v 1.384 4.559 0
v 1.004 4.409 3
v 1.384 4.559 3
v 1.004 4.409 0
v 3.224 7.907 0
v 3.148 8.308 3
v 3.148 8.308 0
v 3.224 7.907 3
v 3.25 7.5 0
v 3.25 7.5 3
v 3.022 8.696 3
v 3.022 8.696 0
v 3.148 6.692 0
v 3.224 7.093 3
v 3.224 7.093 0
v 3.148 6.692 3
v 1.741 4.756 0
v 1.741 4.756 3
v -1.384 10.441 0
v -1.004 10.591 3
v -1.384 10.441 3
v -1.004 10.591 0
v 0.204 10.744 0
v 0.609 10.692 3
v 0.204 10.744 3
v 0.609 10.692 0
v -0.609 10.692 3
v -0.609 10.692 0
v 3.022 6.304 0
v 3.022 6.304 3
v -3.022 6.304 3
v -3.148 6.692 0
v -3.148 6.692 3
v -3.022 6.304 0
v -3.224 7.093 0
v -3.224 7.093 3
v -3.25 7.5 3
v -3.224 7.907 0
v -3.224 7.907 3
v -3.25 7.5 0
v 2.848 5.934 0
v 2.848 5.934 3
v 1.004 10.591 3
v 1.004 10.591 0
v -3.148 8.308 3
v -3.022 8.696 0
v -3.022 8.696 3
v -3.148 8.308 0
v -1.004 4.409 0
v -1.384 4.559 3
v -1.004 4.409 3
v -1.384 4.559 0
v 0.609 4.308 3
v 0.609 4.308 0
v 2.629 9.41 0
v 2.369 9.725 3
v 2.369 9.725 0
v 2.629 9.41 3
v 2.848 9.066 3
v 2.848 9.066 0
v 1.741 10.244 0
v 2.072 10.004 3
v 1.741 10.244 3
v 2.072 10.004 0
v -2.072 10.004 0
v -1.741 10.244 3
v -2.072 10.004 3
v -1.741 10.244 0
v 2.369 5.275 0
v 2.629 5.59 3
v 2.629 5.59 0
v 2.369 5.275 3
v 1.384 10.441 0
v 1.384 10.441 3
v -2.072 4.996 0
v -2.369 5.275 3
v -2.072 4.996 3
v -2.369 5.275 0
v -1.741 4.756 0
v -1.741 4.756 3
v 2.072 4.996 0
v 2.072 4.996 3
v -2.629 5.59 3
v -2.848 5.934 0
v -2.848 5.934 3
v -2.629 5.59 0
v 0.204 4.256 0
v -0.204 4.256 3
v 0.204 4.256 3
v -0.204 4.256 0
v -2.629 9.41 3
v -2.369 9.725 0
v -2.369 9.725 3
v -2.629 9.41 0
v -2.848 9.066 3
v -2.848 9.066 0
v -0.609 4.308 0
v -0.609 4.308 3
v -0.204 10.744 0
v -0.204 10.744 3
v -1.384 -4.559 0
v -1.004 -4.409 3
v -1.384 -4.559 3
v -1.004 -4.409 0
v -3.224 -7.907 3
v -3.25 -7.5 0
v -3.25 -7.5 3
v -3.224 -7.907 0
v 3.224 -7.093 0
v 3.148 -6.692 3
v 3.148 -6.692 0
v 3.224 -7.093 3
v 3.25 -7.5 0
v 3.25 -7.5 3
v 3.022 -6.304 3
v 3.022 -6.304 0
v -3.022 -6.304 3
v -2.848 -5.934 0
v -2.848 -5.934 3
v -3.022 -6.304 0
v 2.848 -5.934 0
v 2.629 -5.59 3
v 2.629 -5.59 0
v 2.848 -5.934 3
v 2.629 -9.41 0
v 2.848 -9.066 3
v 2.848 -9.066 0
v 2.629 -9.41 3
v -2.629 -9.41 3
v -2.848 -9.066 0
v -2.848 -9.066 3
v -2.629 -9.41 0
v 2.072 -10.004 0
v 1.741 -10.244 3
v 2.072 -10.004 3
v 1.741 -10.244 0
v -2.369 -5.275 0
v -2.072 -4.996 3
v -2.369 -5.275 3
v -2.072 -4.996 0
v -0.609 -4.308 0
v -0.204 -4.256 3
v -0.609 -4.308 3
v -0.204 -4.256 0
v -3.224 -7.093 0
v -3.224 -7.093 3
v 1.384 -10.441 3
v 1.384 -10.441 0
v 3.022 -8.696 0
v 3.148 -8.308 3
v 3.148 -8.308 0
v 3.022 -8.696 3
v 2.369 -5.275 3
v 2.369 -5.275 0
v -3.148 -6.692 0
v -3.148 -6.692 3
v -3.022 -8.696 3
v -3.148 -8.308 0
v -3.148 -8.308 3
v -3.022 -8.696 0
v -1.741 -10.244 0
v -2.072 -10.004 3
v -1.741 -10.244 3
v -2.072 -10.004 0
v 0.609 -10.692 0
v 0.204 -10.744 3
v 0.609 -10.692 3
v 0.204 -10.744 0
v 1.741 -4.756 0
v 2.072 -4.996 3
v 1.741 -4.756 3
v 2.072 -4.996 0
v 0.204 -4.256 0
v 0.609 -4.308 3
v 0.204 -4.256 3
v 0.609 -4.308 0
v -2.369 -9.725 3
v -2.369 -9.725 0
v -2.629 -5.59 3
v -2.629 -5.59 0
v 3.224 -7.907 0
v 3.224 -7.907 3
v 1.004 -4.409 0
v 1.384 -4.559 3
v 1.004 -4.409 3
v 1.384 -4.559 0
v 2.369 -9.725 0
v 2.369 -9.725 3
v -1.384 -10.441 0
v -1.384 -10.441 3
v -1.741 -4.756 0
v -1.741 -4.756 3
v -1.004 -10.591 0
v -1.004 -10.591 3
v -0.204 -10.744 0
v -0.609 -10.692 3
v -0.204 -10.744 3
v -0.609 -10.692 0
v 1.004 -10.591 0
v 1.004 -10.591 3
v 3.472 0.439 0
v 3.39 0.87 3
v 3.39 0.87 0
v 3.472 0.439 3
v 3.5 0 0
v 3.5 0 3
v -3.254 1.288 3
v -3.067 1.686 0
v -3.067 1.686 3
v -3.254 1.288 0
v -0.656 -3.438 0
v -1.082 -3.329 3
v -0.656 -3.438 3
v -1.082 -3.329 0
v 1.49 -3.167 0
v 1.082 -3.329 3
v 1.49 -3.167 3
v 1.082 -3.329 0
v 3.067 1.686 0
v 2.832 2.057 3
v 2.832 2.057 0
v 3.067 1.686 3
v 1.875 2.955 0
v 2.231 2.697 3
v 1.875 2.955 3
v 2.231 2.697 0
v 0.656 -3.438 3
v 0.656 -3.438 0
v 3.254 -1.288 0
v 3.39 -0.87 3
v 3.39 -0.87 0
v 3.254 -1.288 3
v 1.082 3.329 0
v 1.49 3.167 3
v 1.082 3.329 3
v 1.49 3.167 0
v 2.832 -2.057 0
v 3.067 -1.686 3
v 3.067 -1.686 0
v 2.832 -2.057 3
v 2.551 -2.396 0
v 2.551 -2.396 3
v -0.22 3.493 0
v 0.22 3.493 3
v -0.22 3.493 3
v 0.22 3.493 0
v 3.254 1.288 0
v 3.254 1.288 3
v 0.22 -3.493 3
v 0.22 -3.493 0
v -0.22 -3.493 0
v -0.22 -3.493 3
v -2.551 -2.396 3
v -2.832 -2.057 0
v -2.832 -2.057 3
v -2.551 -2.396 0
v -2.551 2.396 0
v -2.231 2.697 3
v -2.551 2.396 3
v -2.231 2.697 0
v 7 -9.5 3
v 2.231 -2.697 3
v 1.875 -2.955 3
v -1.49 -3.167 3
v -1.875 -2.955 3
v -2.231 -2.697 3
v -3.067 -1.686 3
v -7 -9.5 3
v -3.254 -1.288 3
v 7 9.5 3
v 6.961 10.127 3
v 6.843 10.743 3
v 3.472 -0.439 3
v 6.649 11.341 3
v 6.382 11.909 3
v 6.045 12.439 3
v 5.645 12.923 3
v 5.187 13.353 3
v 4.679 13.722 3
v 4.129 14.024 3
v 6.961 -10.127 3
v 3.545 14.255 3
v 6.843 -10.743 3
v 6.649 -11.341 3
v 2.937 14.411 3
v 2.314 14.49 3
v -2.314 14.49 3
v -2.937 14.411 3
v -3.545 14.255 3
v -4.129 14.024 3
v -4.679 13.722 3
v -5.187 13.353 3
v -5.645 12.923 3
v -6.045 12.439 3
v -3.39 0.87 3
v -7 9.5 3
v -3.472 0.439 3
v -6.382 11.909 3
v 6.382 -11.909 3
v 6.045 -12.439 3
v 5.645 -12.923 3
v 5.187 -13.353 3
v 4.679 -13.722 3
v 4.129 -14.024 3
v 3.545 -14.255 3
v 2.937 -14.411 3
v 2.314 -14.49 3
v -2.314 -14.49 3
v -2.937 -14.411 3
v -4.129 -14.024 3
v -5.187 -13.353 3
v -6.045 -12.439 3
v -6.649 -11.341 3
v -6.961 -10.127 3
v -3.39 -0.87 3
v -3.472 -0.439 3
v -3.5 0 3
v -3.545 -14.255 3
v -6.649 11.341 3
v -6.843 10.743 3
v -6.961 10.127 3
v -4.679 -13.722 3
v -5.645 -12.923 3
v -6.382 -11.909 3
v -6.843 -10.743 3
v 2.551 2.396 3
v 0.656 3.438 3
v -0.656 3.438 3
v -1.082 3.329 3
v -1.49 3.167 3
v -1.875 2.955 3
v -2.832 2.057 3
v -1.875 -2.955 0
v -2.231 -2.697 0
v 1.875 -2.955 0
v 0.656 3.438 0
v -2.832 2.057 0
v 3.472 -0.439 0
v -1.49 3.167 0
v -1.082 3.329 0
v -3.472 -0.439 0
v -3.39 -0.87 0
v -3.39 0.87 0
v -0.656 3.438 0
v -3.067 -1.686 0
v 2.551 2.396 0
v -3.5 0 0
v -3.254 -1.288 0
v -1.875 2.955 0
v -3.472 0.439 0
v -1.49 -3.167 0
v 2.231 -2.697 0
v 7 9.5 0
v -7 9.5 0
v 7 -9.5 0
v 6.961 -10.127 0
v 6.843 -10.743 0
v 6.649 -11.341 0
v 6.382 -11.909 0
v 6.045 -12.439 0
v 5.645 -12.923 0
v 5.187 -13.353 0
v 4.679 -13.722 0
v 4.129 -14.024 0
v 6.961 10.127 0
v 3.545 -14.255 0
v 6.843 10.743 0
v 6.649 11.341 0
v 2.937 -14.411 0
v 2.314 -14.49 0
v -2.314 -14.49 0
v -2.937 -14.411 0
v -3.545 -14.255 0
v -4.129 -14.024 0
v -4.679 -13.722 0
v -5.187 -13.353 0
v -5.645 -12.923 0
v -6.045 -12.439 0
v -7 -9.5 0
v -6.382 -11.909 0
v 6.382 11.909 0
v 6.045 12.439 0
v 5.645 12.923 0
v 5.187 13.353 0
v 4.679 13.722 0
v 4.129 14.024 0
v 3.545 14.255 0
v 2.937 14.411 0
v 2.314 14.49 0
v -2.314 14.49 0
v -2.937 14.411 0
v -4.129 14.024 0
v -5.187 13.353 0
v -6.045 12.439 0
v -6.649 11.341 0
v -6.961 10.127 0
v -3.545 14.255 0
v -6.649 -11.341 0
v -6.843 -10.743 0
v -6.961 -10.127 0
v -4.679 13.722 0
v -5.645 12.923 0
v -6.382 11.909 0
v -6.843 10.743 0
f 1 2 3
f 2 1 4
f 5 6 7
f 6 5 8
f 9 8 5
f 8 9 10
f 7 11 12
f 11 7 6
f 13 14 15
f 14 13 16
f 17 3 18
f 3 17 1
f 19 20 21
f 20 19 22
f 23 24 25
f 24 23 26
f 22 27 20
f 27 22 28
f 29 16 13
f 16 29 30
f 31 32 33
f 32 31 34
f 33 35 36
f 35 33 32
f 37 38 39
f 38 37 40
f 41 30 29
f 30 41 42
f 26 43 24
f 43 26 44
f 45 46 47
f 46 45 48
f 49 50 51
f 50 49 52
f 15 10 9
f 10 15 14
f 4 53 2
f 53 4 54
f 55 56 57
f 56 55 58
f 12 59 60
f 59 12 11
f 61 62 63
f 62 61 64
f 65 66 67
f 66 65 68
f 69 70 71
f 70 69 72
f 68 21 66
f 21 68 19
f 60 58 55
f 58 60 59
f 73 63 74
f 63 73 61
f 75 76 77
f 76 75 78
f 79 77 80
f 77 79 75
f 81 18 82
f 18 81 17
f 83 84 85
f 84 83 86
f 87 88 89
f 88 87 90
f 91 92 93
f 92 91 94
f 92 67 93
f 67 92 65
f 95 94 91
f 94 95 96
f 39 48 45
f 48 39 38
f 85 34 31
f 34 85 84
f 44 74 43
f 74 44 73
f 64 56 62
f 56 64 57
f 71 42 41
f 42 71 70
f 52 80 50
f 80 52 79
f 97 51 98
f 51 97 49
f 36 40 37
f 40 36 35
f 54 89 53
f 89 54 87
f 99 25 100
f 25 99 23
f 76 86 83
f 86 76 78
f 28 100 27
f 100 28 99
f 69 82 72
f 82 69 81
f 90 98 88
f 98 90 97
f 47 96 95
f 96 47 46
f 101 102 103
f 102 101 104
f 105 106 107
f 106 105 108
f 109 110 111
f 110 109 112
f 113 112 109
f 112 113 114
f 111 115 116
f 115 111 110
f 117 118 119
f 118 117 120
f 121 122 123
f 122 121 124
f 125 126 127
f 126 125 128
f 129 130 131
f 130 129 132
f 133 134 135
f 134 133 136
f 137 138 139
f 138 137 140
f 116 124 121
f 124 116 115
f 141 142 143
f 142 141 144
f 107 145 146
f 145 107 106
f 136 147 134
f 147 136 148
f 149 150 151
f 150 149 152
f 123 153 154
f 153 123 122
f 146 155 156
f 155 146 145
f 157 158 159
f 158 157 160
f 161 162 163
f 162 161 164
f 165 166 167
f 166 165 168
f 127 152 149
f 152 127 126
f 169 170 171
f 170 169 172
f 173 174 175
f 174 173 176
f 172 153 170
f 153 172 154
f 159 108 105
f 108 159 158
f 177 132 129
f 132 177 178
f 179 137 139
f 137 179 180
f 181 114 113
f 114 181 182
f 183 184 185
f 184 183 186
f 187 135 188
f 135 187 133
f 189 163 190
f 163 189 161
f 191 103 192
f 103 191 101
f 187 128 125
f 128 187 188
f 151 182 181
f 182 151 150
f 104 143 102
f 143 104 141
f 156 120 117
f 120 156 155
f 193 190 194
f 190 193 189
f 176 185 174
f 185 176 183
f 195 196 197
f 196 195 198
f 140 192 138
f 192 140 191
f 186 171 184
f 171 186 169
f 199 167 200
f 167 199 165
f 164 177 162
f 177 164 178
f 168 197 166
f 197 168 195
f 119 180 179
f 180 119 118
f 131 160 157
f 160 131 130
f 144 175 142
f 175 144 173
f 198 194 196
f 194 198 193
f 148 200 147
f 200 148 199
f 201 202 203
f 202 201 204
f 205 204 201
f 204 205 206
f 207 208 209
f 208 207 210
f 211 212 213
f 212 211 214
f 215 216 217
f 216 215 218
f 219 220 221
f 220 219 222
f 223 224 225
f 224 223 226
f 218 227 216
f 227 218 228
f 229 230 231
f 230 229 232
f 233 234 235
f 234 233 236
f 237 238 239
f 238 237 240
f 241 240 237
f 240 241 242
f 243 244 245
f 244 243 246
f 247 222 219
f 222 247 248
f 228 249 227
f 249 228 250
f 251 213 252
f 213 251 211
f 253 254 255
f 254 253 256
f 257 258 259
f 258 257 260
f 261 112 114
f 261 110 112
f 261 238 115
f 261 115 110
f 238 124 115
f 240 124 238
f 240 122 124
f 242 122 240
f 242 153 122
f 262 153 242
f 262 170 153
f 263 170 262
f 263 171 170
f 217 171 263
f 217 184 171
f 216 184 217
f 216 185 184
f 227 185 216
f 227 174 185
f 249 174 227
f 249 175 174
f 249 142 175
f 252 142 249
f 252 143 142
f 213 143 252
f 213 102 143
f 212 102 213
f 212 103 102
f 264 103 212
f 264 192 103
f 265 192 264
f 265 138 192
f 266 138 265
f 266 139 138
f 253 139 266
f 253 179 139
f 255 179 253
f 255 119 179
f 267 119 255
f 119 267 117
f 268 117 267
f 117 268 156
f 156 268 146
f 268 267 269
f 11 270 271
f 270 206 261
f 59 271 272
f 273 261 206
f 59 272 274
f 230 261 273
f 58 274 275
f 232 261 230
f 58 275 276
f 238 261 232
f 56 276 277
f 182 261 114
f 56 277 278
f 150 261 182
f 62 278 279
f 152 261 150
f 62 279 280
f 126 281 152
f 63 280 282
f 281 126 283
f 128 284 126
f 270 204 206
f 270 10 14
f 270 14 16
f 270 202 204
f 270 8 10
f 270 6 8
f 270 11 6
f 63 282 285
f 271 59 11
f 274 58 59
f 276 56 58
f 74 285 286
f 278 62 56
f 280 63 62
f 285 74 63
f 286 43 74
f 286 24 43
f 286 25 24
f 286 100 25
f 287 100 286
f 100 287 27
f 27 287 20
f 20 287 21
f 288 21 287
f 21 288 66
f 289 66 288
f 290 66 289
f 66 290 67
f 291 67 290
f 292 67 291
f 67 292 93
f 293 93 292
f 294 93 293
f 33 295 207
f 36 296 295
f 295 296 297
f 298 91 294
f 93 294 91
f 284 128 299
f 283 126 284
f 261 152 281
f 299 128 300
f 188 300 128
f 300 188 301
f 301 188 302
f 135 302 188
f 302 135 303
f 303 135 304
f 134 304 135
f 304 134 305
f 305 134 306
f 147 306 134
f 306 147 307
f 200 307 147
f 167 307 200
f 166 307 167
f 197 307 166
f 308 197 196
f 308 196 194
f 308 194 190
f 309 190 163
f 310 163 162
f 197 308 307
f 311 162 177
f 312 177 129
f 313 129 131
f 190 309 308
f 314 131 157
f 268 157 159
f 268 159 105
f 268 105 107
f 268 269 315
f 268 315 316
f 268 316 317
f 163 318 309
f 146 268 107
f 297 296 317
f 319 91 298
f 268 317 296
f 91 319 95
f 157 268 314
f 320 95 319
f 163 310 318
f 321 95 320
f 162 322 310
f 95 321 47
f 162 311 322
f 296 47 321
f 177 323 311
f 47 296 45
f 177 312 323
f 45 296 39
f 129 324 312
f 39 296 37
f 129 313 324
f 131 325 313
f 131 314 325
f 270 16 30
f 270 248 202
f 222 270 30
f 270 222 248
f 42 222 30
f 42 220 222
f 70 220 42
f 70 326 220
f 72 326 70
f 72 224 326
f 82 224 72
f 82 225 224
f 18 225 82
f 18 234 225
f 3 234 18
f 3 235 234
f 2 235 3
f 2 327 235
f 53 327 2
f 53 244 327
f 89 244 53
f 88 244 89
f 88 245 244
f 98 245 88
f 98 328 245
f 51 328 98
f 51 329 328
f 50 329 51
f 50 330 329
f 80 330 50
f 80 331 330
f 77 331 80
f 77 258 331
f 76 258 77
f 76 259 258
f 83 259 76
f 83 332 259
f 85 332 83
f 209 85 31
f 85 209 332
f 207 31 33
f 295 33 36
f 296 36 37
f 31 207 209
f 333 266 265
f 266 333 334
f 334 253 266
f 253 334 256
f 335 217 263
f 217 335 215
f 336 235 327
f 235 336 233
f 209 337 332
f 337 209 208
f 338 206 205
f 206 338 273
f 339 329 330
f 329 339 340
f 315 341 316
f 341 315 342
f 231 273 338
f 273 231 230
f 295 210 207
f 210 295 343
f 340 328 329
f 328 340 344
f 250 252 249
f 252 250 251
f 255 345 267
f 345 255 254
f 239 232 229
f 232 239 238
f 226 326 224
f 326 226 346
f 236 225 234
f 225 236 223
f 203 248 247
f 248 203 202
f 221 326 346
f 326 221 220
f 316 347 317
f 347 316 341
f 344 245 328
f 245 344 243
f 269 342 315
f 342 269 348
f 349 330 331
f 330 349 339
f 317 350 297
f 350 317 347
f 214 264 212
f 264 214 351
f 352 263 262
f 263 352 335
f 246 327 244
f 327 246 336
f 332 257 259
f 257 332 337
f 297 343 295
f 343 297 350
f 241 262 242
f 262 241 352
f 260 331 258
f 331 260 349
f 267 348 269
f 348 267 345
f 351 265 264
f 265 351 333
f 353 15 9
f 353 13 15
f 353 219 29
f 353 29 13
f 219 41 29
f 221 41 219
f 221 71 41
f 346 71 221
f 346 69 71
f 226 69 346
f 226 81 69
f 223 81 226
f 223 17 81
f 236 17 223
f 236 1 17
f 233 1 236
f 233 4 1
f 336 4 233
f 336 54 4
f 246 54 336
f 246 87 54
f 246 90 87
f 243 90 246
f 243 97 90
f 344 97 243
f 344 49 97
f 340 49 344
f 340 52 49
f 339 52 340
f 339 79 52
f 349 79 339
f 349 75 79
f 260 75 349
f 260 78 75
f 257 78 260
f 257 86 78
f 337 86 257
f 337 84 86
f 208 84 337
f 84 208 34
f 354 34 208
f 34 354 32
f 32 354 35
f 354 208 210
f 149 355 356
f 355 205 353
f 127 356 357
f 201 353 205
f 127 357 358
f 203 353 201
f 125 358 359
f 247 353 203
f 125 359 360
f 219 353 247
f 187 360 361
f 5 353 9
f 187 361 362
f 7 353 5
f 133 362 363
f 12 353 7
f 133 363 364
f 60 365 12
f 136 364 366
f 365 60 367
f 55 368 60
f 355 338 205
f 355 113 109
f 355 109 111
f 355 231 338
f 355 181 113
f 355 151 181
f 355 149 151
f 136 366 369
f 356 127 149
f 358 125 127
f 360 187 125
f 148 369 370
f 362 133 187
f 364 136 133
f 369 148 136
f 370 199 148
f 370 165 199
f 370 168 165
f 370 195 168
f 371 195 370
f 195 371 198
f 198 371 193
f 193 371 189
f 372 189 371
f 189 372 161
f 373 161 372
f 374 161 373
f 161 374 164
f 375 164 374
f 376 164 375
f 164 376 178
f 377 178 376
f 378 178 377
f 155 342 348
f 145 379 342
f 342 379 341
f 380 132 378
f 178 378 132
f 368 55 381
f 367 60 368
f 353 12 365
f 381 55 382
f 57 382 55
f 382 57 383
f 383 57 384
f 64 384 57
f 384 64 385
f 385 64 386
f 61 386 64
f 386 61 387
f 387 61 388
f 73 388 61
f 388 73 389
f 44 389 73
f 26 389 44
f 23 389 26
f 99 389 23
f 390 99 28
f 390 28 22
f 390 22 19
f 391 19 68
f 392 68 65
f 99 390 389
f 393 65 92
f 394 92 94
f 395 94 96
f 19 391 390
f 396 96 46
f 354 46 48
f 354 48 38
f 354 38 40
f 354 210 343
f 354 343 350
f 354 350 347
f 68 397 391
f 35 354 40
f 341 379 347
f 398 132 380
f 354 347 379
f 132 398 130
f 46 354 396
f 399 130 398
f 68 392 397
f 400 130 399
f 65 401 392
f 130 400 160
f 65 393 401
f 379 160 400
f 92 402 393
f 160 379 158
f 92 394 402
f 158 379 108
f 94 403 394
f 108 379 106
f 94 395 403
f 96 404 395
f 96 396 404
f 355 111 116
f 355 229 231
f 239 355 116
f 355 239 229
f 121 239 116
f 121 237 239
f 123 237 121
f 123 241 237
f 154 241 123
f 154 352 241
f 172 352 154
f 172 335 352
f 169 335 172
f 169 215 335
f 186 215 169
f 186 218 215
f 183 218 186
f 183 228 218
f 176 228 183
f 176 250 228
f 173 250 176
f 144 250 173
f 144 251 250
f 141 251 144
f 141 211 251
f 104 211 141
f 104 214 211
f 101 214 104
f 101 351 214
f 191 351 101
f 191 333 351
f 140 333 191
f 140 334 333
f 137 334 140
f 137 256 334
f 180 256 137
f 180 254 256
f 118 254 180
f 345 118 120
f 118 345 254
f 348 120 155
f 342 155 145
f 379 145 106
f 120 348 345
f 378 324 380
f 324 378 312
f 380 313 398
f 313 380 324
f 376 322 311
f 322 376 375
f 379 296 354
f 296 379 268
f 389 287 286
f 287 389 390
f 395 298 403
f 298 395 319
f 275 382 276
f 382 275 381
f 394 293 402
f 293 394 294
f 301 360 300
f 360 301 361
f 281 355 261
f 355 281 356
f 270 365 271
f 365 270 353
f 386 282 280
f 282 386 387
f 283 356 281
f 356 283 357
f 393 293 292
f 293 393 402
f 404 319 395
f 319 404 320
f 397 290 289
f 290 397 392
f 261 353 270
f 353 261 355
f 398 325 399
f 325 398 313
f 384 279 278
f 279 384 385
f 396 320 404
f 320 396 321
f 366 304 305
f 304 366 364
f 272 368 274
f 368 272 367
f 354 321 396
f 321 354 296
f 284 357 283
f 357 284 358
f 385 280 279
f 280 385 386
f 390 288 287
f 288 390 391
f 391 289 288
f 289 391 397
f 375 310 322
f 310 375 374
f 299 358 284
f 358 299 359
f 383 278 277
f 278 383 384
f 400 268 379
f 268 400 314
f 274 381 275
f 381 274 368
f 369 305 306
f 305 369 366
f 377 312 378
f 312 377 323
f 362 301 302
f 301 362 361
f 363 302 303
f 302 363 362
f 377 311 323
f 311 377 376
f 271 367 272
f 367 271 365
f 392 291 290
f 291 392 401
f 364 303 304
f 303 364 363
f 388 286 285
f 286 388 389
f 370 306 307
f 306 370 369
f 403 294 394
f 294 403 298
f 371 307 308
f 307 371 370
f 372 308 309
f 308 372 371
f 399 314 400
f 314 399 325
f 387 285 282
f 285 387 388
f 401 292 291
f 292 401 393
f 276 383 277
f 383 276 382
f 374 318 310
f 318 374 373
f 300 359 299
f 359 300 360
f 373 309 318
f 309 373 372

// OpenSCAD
$fn = 50;


difference() {
	union() {
		hull() {
			translate(v = [-2.0000000000, 9.5000000000, 0]) {
				cylinder(h = 3, r = 5);
			}
			translate(v = [2.0000000000, 9.5000000000, 0]) {
				cylinder(h = 3, r = 5);
			}
			translate(v = [-2.0000000000, -9.5000000000, 0]) {
				cylinder(h = 3, r = 5);
			}
			translate(v = [2.0000000000, -9.5000000000, 0]) {
				cylinder(h = 3, r = 5);
			}
		}
	}
	union() {
		#translate(v = [0.0000000000, 7.5000000000, 0]) {
			cylinder(h = 3, r = 3.2500000000);
		}
		#translate(v = [0.0000000000, -7.5000000000, 0]) {
			cylinder(h = 3, r = 3.2500000000);
		}
		#translate(v = [0.0000000000, -7.5000000000, -100.0000000000]) {
			cylinder(h = 200, r = 3.2500000000);
		}
		#translate(v = [0.0000000000, -7.5000000000, -100.0000000000]) {
			cylinder(h = 200, r = 3.2500000000);
		}
		#translate(v = [0.0000000000, 7.5000000000, -100.0000000000]) {
			cylinder(h = 200, r = 3.2500000000);
		}
		#translate(v = [0.0000000000, 7.5000000000, -100.0000000000]) {
			cylinder(h = 200, r = 3.2500000000);
		}
		#translate(v = [0.0000000000, 7.5000000000, 0]) {
			cylinder(h = 3, r = 1.8000000000);
		}
		#translate(v = [0.0000000000, -7.5000000000, 0]) {
			cylinder(h = 3, r = 1.8000000000);
		}
		#translate(v = [0.0000000000, 7.5000000000, 0]) {
			cylinder(h = 3, r = 1.8000000000);
		}
		#translate(v = [0.0000000000, -7.5000000000, 0]) {
			cylinder(h = 3, r = 1.8000000000);
		}
		#translate(v = [0.0000000000, 7.5000000000, 0]) {
			cylinder(h = 3, r = 1.8000000000);
		}
		#translate(v = [0.0000000000, -7.5000000000, 0]) {
			cylinder(h = 3, r = 1.8000000000);
		}
		#cylinder(h = 3, r = 3.5000000000);
	}
}
